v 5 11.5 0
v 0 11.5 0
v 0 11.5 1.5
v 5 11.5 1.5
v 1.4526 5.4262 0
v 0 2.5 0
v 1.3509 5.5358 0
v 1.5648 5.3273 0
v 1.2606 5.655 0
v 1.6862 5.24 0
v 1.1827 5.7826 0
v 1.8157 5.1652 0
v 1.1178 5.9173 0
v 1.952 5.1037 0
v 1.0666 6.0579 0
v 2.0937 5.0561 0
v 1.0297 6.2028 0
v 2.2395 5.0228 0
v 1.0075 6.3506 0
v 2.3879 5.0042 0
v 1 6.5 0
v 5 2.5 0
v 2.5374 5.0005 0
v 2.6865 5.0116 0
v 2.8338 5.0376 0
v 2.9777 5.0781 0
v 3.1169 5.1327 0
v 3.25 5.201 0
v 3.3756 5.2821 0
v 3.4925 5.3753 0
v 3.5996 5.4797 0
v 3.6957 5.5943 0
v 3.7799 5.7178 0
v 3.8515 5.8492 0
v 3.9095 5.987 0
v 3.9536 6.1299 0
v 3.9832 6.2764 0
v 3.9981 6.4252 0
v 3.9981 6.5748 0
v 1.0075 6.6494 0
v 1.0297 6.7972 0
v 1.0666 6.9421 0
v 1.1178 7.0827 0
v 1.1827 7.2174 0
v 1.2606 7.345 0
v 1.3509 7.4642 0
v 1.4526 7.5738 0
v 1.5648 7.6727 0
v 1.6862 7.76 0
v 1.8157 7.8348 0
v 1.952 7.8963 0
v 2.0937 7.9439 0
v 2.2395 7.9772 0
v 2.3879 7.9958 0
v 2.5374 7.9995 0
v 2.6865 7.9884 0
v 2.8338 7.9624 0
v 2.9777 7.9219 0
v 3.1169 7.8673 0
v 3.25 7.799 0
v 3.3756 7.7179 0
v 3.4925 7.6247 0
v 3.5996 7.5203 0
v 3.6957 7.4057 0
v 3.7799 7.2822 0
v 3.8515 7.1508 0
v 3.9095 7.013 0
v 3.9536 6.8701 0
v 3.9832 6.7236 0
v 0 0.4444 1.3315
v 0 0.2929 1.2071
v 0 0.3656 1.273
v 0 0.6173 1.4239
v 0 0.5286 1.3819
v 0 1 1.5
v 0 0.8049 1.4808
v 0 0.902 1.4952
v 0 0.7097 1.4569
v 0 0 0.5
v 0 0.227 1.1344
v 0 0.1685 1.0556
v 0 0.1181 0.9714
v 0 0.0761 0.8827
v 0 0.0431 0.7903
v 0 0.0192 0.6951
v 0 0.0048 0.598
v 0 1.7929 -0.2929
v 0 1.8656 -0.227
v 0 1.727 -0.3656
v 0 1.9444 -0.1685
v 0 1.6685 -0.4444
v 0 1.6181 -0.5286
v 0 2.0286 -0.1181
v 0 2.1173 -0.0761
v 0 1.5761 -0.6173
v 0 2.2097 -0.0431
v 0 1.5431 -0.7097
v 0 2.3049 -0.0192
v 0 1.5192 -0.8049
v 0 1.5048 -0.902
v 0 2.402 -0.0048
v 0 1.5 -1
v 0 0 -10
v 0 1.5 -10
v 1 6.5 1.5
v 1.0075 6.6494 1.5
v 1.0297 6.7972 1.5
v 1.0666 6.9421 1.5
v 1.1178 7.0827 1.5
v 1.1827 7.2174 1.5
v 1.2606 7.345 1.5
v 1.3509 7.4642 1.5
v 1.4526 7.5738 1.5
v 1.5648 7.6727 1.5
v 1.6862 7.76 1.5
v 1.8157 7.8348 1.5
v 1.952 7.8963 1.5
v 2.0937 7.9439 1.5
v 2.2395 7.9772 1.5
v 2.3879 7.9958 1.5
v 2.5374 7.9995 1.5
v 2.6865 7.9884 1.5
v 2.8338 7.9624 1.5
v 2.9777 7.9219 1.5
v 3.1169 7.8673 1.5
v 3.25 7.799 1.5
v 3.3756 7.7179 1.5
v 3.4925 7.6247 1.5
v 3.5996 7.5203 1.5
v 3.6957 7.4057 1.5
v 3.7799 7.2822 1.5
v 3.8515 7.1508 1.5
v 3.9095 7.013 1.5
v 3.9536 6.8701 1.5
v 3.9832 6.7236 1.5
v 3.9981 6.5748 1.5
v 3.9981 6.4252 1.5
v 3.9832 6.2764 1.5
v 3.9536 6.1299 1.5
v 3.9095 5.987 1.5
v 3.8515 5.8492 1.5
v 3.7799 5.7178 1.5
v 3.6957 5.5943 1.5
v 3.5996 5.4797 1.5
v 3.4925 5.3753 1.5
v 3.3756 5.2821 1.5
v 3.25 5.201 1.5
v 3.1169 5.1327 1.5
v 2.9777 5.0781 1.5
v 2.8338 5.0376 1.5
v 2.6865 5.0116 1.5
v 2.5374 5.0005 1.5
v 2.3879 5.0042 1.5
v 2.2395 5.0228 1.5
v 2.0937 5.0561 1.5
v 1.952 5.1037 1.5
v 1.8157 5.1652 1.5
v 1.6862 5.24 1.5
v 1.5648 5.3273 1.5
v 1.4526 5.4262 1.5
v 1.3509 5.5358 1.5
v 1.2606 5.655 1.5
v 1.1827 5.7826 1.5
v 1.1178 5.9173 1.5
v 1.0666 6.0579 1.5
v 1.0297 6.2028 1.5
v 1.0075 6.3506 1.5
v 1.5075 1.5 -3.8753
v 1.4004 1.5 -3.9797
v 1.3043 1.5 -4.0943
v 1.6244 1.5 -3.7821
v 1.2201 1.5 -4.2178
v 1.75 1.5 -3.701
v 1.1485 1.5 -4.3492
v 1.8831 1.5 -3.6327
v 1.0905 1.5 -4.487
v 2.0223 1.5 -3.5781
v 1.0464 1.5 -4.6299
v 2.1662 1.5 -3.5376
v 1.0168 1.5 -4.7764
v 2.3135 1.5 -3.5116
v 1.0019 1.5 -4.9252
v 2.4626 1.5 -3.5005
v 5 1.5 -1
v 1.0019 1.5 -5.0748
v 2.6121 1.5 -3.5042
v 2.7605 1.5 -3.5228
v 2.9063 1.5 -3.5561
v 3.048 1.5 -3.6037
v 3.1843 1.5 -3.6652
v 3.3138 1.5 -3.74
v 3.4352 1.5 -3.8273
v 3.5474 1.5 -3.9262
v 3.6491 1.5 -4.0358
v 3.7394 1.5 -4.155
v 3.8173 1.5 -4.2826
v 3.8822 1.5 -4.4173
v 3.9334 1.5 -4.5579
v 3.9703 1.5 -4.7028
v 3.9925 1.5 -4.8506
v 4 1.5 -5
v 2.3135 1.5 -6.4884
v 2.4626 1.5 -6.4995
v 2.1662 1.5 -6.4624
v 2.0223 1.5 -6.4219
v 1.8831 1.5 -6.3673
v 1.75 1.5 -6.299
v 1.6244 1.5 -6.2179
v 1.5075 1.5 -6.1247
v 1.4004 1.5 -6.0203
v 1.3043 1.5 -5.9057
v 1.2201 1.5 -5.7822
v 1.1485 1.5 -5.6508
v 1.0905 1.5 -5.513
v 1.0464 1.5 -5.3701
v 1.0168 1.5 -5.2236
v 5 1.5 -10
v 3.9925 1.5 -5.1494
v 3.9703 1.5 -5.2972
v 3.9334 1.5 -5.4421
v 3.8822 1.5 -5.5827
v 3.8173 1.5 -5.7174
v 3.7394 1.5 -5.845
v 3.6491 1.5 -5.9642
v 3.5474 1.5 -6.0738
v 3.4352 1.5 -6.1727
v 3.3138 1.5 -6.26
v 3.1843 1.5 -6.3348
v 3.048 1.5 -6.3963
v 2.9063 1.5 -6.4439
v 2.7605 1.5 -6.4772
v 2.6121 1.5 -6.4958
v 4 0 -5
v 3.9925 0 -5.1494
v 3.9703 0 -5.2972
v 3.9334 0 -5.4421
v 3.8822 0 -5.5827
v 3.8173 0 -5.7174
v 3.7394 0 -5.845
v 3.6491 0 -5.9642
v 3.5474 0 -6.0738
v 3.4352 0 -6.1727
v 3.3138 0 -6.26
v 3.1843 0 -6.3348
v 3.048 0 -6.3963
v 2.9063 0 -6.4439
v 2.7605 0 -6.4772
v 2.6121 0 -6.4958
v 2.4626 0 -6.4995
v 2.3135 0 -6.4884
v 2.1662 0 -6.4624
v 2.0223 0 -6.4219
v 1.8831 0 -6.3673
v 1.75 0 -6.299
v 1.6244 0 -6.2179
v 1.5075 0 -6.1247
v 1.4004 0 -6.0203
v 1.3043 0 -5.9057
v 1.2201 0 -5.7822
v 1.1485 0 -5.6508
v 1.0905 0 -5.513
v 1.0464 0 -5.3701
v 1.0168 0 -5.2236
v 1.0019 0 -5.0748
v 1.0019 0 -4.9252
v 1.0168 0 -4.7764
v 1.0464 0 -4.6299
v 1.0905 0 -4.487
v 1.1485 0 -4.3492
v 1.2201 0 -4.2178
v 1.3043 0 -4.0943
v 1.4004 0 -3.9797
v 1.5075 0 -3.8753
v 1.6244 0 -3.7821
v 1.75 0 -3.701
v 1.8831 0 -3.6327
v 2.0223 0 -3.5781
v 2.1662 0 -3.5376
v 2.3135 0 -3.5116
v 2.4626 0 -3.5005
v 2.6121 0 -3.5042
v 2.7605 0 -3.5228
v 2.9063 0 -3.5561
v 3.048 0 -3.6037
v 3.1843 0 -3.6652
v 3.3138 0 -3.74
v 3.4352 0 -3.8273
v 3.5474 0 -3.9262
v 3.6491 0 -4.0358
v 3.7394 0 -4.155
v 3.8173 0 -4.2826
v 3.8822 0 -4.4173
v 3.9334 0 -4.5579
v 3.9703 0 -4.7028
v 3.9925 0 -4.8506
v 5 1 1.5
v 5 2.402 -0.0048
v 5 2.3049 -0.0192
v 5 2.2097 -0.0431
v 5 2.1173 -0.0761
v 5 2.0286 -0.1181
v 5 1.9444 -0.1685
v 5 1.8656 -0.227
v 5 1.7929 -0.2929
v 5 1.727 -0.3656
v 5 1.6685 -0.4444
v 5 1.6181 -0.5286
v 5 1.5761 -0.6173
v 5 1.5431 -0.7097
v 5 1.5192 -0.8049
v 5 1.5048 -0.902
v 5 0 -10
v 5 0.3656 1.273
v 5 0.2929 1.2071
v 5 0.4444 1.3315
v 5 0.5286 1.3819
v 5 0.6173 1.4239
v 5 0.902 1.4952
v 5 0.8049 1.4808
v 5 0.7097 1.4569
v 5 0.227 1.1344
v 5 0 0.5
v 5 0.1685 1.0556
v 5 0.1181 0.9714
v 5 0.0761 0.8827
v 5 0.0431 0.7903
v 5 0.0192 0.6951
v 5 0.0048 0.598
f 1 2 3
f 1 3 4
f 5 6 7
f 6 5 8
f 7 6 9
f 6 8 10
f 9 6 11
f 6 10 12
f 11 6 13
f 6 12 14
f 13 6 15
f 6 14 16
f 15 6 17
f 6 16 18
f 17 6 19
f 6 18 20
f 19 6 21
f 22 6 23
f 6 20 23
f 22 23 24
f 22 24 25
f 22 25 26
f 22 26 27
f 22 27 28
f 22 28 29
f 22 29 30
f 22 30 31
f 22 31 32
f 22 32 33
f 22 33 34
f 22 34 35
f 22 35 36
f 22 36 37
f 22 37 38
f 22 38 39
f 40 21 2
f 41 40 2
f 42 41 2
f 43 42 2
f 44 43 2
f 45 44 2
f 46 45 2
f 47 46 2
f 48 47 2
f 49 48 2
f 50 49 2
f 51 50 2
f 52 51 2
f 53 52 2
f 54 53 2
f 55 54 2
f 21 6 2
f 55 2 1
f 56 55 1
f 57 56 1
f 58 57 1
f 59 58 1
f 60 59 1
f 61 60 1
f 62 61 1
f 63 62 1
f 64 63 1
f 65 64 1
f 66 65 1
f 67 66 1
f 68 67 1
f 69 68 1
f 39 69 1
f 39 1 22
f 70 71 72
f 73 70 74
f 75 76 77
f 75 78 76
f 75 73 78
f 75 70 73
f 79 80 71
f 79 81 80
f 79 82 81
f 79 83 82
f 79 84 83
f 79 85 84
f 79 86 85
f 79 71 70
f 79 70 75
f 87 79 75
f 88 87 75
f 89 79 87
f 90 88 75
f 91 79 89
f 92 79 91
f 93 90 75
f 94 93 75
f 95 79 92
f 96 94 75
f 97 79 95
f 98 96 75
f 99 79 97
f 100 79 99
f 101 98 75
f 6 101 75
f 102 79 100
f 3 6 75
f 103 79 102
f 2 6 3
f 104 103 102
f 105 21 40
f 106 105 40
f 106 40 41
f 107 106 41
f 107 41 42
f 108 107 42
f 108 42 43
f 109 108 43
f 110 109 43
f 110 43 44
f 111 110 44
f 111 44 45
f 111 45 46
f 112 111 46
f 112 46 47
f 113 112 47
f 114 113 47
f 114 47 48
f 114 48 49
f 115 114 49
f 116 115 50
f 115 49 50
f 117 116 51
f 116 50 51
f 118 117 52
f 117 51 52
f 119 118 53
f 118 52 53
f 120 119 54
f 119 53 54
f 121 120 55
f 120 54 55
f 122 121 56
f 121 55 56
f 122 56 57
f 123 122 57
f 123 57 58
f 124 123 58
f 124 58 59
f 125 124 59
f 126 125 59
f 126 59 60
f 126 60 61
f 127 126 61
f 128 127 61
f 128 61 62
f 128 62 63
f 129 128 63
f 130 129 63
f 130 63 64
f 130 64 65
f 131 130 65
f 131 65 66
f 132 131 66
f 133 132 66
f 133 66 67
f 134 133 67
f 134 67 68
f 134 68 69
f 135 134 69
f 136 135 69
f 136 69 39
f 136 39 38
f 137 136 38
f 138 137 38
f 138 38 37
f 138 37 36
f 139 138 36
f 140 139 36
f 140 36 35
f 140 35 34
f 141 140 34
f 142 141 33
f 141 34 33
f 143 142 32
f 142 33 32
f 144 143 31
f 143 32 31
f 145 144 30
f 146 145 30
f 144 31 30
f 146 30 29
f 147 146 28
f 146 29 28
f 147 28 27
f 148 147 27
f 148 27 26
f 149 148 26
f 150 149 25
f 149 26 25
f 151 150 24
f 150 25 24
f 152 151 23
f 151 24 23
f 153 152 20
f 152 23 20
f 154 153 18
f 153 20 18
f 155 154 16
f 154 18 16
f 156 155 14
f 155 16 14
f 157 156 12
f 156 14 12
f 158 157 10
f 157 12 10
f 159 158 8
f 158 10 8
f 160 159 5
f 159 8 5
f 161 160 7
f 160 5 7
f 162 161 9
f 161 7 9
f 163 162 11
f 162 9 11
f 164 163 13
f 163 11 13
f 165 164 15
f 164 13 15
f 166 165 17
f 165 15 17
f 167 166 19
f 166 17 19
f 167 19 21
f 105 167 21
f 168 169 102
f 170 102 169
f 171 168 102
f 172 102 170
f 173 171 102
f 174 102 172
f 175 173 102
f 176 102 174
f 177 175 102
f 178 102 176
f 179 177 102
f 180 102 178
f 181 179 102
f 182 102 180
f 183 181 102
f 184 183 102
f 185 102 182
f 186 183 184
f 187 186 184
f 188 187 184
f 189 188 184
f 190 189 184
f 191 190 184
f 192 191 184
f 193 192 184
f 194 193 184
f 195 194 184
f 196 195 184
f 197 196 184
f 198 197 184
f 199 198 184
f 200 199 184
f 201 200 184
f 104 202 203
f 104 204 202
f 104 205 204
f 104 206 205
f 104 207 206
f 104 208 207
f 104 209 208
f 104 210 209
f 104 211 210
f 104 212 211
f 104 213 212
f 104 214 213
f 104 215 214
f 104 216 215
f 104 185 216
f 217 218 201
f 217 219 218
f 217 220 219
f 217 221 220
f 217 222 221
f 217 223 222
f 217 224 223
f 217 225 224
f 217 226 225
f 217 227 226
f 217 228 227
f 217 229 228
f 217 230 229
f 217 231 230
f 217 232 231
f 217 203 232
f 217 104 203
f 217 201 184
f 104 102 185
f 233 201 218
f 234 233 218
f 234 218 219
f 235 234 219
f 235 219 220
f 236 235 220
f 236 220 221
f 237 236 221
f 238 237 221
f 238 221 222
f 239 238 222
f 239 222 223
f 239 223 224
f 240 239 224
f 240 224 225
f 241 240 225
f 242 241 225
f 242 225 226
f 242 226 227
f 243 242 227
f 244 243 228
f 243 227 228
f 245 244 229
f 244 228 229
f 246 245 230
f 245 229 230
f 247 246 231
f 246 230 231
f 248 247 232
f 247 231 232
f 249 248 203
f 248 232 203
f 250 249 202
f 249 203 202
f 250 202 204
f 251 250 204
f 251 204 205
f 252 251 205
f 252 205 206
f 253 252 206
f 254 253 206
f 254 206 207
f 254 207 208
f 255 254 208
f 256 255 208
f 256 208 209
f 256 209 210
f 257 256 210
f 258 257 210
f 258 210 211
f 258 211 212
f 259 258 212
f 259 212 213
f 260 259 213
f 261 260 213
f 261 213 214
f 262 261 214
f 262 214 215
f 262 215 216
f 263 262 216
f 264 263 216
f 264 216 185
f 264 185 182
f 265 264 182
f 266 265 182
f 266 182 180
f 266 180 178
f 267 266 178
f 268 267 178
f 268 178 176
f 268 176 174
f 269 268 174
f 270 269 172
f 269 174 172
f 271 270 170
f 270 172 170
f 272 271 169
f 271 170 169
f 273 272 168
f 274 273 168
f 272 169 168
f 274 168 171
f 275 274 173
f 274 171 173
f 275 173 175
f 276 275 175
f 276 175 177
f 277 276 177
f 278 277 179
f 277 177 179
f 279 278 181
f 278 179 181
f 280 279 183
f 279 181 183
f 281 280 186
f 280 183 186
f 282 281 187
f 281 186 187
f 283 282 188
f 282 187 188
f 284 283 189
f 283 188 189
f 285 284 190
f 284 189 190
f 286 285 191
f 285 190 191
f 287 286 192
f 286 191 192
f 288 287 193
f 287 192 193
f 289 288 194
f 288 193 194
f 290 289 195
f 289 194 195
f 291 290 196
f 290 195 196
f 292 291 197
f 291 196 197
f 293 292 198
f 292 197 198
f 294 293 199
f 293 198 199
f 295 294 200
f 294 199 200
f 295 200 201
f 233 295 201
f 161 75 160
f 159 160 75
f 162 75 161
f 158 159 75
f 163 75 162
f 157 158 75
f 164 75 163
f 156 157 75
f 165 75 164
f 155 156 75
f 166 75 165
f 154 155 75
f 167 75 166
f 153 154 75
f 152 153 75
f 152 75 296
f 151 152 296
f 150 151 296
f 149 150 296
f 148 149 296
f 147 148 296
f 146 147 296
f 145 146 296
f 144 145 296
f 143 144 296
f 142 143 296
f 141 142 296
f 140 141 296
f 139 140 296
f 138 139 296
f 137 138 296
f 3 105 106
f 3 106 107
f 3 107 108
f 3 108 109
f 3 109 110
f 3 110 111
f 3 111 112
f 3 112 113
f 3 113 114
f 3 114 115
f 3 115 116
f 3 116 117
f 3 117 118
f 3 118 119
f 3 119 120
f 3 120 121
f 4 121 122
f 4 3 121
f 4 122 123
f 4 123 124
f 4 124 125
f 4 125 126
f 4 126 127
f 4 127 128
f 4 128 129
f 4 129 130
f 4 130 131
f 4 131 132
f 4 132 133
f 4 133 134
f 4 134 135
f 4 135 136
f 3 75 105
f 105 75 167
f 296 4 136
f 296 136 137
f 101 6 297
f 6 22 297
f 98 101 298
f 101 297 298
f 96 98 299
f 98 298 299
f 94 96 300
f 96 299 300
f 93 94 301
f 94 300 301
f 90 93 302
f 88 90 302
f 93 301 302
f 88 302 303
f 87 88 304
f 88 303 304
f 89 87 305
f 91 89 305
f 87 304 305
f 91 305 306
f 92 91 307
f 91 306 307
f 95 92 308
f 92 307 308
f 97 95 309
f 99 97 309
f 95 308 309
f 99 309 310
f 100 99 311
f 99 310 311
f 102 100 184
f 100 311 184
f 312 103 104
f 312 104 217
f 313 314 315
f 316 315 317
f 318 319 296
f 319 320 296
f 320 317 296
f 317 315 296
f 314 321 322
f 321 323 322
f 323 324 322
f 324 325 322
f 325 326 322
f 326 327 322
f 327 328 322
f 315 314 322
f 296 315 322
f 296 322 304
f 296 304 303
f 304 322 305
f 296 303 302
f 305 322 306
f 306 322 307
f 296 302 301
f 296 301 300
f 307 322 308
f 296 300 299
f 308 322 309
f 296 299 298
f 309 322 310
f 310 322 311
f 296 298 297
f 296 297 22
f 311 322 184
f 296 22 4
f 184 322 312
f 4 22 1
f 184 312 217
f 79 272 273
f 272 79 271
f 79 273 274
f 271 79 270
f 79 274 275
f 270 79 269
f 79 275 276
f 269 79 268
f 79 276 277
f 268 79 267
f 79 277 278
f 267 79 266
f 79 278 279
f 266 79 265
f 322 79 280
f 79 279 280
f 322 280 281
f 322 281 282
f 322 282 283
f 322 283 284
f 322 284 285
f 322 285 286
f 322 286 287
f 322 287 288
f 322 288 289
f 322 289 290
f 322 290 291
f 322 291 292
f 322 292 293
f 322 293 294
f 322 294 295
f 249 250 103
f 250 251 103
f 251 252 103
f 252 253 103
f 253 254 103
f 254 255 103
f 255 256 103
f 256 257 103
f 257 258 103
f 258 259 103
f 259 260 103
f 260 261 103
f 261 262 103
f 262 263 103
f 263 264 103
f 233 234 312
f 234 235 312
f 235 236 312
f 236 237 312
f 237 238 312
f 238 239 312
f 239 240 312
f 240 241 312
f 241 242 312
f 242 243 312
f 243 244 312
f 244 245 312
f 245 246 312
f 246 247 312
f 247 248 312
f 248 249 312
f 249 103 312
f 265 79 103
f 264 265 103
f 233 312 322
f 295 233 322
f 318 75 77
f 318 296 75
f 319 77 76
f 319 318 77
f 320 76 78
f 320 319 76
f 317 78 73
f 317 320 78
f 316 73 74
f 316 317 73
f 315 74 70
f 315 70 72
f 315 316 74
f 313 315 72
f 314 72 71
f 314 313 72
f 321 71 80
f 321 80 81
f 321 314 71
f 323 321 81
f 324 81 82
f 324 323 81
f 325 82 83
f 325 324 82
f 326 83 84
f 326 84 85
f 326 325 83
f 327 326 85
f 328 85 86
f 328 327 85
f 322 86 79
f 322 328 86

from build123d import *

# Parameters (mm, degrees)
SKETCH1_W               = 5
SKETCH1_H               = 10
BOSS_EXTRUDE1_DEPTH     = 1.5
SKETCH2_W               = 5
SKETCH2_H               = 11.5
BOSS_EXTRUDE2_DEPTH     = 1.5
CUT_EXTRUDE1_DEPTH      = 1.5
CUT_EXTRUDE1_DEPTH_BACK = 10
SKETCH3_R               = 1.5
CUT_EXTRUDE2_DEPTH      = 10
CUT_EXTRUDE2_DEPTH_BACK = 10
SKETCH4_R               = 1.5
FILLET1_R               = 1
FILLET2_R               = 1


with BuildPart() as part:
    # Sketch1 → Boss-Extrude1 (new body)
    with BuildSketch(Plane(origin=(0, 0, 0), x_dir=(1, 0, 0), z_dir=(0, 1, 0))):
        with Locations((2.5, 5)):
            Rectangle(SKETCH1_W, SKETCH1_H)
    extrude(amount=BOSS_EXTRUDE1_DEPTH)

    # Sketch2 → Boss-Extrude2 (add)
    with BuildSketch(Plane.XY):
        with Locations((2.5, 5.75)):
            Rectangle(SKETCH2_W, SKETCH2_H)
    extrude(amount=BOSS_EXTRUDE2_DEPTH)

    # Sketch3 → Cut-Extrude1 (cut, two sides: drawn at the far end of the back side and taken through both)
    with BuildSketch(Plane(origin=(0, 1.5, 0), x_dir=(1, 0, 0), z_dir=(0, 1, 0)).offset(-CUT_EXTRUDE1_DEPTH_BACK)):
        with Locations((2.5, 5)):
            Circle(SKETCH3_R)
    extrude(amount=CUT_EXTRUDE1_DEPTH + CUT_EXTRUDE1_DEPTH_BACK, mode=Mode.SUBTRACT)

    # Sketch4 → Cut-Extrude2 (cut, two sides: drawn at the far end of the back side and taken through both)
    with BuildSketch(Plane(origin=(0, 0, 0), x_dir=(-1, 0, 0), z_dir=(0, 0, -1)).offset(-CUT_EXTRUDE2_DEPTH_BACK)):
        with Locations((-2.5, 6.5)):
            Circle(SKETCH4_R)
    extrude(amount=CUT_EXTRUDE2_DEPTH + CUT_EXTRUDE2_DEPTH_BACK, mode=Mode.SUBTRACT)

    # Fillet1
    fillet1_edges = [part.edges().sort_by_distance(p)[0] for p in [
        (2.5, 1.5, 0),
    ]]
    fillet(fillet1_edges, radius=FILLET1_R)

    # Fillet2
    fillet2_edges = [part.edges().sort_by_distance(p)[0] for p in [
        (2.5, 0, 1.5),
    ]]
    fillet(fillet2_edges, radius=FILLET2_R)


solid = part.part
